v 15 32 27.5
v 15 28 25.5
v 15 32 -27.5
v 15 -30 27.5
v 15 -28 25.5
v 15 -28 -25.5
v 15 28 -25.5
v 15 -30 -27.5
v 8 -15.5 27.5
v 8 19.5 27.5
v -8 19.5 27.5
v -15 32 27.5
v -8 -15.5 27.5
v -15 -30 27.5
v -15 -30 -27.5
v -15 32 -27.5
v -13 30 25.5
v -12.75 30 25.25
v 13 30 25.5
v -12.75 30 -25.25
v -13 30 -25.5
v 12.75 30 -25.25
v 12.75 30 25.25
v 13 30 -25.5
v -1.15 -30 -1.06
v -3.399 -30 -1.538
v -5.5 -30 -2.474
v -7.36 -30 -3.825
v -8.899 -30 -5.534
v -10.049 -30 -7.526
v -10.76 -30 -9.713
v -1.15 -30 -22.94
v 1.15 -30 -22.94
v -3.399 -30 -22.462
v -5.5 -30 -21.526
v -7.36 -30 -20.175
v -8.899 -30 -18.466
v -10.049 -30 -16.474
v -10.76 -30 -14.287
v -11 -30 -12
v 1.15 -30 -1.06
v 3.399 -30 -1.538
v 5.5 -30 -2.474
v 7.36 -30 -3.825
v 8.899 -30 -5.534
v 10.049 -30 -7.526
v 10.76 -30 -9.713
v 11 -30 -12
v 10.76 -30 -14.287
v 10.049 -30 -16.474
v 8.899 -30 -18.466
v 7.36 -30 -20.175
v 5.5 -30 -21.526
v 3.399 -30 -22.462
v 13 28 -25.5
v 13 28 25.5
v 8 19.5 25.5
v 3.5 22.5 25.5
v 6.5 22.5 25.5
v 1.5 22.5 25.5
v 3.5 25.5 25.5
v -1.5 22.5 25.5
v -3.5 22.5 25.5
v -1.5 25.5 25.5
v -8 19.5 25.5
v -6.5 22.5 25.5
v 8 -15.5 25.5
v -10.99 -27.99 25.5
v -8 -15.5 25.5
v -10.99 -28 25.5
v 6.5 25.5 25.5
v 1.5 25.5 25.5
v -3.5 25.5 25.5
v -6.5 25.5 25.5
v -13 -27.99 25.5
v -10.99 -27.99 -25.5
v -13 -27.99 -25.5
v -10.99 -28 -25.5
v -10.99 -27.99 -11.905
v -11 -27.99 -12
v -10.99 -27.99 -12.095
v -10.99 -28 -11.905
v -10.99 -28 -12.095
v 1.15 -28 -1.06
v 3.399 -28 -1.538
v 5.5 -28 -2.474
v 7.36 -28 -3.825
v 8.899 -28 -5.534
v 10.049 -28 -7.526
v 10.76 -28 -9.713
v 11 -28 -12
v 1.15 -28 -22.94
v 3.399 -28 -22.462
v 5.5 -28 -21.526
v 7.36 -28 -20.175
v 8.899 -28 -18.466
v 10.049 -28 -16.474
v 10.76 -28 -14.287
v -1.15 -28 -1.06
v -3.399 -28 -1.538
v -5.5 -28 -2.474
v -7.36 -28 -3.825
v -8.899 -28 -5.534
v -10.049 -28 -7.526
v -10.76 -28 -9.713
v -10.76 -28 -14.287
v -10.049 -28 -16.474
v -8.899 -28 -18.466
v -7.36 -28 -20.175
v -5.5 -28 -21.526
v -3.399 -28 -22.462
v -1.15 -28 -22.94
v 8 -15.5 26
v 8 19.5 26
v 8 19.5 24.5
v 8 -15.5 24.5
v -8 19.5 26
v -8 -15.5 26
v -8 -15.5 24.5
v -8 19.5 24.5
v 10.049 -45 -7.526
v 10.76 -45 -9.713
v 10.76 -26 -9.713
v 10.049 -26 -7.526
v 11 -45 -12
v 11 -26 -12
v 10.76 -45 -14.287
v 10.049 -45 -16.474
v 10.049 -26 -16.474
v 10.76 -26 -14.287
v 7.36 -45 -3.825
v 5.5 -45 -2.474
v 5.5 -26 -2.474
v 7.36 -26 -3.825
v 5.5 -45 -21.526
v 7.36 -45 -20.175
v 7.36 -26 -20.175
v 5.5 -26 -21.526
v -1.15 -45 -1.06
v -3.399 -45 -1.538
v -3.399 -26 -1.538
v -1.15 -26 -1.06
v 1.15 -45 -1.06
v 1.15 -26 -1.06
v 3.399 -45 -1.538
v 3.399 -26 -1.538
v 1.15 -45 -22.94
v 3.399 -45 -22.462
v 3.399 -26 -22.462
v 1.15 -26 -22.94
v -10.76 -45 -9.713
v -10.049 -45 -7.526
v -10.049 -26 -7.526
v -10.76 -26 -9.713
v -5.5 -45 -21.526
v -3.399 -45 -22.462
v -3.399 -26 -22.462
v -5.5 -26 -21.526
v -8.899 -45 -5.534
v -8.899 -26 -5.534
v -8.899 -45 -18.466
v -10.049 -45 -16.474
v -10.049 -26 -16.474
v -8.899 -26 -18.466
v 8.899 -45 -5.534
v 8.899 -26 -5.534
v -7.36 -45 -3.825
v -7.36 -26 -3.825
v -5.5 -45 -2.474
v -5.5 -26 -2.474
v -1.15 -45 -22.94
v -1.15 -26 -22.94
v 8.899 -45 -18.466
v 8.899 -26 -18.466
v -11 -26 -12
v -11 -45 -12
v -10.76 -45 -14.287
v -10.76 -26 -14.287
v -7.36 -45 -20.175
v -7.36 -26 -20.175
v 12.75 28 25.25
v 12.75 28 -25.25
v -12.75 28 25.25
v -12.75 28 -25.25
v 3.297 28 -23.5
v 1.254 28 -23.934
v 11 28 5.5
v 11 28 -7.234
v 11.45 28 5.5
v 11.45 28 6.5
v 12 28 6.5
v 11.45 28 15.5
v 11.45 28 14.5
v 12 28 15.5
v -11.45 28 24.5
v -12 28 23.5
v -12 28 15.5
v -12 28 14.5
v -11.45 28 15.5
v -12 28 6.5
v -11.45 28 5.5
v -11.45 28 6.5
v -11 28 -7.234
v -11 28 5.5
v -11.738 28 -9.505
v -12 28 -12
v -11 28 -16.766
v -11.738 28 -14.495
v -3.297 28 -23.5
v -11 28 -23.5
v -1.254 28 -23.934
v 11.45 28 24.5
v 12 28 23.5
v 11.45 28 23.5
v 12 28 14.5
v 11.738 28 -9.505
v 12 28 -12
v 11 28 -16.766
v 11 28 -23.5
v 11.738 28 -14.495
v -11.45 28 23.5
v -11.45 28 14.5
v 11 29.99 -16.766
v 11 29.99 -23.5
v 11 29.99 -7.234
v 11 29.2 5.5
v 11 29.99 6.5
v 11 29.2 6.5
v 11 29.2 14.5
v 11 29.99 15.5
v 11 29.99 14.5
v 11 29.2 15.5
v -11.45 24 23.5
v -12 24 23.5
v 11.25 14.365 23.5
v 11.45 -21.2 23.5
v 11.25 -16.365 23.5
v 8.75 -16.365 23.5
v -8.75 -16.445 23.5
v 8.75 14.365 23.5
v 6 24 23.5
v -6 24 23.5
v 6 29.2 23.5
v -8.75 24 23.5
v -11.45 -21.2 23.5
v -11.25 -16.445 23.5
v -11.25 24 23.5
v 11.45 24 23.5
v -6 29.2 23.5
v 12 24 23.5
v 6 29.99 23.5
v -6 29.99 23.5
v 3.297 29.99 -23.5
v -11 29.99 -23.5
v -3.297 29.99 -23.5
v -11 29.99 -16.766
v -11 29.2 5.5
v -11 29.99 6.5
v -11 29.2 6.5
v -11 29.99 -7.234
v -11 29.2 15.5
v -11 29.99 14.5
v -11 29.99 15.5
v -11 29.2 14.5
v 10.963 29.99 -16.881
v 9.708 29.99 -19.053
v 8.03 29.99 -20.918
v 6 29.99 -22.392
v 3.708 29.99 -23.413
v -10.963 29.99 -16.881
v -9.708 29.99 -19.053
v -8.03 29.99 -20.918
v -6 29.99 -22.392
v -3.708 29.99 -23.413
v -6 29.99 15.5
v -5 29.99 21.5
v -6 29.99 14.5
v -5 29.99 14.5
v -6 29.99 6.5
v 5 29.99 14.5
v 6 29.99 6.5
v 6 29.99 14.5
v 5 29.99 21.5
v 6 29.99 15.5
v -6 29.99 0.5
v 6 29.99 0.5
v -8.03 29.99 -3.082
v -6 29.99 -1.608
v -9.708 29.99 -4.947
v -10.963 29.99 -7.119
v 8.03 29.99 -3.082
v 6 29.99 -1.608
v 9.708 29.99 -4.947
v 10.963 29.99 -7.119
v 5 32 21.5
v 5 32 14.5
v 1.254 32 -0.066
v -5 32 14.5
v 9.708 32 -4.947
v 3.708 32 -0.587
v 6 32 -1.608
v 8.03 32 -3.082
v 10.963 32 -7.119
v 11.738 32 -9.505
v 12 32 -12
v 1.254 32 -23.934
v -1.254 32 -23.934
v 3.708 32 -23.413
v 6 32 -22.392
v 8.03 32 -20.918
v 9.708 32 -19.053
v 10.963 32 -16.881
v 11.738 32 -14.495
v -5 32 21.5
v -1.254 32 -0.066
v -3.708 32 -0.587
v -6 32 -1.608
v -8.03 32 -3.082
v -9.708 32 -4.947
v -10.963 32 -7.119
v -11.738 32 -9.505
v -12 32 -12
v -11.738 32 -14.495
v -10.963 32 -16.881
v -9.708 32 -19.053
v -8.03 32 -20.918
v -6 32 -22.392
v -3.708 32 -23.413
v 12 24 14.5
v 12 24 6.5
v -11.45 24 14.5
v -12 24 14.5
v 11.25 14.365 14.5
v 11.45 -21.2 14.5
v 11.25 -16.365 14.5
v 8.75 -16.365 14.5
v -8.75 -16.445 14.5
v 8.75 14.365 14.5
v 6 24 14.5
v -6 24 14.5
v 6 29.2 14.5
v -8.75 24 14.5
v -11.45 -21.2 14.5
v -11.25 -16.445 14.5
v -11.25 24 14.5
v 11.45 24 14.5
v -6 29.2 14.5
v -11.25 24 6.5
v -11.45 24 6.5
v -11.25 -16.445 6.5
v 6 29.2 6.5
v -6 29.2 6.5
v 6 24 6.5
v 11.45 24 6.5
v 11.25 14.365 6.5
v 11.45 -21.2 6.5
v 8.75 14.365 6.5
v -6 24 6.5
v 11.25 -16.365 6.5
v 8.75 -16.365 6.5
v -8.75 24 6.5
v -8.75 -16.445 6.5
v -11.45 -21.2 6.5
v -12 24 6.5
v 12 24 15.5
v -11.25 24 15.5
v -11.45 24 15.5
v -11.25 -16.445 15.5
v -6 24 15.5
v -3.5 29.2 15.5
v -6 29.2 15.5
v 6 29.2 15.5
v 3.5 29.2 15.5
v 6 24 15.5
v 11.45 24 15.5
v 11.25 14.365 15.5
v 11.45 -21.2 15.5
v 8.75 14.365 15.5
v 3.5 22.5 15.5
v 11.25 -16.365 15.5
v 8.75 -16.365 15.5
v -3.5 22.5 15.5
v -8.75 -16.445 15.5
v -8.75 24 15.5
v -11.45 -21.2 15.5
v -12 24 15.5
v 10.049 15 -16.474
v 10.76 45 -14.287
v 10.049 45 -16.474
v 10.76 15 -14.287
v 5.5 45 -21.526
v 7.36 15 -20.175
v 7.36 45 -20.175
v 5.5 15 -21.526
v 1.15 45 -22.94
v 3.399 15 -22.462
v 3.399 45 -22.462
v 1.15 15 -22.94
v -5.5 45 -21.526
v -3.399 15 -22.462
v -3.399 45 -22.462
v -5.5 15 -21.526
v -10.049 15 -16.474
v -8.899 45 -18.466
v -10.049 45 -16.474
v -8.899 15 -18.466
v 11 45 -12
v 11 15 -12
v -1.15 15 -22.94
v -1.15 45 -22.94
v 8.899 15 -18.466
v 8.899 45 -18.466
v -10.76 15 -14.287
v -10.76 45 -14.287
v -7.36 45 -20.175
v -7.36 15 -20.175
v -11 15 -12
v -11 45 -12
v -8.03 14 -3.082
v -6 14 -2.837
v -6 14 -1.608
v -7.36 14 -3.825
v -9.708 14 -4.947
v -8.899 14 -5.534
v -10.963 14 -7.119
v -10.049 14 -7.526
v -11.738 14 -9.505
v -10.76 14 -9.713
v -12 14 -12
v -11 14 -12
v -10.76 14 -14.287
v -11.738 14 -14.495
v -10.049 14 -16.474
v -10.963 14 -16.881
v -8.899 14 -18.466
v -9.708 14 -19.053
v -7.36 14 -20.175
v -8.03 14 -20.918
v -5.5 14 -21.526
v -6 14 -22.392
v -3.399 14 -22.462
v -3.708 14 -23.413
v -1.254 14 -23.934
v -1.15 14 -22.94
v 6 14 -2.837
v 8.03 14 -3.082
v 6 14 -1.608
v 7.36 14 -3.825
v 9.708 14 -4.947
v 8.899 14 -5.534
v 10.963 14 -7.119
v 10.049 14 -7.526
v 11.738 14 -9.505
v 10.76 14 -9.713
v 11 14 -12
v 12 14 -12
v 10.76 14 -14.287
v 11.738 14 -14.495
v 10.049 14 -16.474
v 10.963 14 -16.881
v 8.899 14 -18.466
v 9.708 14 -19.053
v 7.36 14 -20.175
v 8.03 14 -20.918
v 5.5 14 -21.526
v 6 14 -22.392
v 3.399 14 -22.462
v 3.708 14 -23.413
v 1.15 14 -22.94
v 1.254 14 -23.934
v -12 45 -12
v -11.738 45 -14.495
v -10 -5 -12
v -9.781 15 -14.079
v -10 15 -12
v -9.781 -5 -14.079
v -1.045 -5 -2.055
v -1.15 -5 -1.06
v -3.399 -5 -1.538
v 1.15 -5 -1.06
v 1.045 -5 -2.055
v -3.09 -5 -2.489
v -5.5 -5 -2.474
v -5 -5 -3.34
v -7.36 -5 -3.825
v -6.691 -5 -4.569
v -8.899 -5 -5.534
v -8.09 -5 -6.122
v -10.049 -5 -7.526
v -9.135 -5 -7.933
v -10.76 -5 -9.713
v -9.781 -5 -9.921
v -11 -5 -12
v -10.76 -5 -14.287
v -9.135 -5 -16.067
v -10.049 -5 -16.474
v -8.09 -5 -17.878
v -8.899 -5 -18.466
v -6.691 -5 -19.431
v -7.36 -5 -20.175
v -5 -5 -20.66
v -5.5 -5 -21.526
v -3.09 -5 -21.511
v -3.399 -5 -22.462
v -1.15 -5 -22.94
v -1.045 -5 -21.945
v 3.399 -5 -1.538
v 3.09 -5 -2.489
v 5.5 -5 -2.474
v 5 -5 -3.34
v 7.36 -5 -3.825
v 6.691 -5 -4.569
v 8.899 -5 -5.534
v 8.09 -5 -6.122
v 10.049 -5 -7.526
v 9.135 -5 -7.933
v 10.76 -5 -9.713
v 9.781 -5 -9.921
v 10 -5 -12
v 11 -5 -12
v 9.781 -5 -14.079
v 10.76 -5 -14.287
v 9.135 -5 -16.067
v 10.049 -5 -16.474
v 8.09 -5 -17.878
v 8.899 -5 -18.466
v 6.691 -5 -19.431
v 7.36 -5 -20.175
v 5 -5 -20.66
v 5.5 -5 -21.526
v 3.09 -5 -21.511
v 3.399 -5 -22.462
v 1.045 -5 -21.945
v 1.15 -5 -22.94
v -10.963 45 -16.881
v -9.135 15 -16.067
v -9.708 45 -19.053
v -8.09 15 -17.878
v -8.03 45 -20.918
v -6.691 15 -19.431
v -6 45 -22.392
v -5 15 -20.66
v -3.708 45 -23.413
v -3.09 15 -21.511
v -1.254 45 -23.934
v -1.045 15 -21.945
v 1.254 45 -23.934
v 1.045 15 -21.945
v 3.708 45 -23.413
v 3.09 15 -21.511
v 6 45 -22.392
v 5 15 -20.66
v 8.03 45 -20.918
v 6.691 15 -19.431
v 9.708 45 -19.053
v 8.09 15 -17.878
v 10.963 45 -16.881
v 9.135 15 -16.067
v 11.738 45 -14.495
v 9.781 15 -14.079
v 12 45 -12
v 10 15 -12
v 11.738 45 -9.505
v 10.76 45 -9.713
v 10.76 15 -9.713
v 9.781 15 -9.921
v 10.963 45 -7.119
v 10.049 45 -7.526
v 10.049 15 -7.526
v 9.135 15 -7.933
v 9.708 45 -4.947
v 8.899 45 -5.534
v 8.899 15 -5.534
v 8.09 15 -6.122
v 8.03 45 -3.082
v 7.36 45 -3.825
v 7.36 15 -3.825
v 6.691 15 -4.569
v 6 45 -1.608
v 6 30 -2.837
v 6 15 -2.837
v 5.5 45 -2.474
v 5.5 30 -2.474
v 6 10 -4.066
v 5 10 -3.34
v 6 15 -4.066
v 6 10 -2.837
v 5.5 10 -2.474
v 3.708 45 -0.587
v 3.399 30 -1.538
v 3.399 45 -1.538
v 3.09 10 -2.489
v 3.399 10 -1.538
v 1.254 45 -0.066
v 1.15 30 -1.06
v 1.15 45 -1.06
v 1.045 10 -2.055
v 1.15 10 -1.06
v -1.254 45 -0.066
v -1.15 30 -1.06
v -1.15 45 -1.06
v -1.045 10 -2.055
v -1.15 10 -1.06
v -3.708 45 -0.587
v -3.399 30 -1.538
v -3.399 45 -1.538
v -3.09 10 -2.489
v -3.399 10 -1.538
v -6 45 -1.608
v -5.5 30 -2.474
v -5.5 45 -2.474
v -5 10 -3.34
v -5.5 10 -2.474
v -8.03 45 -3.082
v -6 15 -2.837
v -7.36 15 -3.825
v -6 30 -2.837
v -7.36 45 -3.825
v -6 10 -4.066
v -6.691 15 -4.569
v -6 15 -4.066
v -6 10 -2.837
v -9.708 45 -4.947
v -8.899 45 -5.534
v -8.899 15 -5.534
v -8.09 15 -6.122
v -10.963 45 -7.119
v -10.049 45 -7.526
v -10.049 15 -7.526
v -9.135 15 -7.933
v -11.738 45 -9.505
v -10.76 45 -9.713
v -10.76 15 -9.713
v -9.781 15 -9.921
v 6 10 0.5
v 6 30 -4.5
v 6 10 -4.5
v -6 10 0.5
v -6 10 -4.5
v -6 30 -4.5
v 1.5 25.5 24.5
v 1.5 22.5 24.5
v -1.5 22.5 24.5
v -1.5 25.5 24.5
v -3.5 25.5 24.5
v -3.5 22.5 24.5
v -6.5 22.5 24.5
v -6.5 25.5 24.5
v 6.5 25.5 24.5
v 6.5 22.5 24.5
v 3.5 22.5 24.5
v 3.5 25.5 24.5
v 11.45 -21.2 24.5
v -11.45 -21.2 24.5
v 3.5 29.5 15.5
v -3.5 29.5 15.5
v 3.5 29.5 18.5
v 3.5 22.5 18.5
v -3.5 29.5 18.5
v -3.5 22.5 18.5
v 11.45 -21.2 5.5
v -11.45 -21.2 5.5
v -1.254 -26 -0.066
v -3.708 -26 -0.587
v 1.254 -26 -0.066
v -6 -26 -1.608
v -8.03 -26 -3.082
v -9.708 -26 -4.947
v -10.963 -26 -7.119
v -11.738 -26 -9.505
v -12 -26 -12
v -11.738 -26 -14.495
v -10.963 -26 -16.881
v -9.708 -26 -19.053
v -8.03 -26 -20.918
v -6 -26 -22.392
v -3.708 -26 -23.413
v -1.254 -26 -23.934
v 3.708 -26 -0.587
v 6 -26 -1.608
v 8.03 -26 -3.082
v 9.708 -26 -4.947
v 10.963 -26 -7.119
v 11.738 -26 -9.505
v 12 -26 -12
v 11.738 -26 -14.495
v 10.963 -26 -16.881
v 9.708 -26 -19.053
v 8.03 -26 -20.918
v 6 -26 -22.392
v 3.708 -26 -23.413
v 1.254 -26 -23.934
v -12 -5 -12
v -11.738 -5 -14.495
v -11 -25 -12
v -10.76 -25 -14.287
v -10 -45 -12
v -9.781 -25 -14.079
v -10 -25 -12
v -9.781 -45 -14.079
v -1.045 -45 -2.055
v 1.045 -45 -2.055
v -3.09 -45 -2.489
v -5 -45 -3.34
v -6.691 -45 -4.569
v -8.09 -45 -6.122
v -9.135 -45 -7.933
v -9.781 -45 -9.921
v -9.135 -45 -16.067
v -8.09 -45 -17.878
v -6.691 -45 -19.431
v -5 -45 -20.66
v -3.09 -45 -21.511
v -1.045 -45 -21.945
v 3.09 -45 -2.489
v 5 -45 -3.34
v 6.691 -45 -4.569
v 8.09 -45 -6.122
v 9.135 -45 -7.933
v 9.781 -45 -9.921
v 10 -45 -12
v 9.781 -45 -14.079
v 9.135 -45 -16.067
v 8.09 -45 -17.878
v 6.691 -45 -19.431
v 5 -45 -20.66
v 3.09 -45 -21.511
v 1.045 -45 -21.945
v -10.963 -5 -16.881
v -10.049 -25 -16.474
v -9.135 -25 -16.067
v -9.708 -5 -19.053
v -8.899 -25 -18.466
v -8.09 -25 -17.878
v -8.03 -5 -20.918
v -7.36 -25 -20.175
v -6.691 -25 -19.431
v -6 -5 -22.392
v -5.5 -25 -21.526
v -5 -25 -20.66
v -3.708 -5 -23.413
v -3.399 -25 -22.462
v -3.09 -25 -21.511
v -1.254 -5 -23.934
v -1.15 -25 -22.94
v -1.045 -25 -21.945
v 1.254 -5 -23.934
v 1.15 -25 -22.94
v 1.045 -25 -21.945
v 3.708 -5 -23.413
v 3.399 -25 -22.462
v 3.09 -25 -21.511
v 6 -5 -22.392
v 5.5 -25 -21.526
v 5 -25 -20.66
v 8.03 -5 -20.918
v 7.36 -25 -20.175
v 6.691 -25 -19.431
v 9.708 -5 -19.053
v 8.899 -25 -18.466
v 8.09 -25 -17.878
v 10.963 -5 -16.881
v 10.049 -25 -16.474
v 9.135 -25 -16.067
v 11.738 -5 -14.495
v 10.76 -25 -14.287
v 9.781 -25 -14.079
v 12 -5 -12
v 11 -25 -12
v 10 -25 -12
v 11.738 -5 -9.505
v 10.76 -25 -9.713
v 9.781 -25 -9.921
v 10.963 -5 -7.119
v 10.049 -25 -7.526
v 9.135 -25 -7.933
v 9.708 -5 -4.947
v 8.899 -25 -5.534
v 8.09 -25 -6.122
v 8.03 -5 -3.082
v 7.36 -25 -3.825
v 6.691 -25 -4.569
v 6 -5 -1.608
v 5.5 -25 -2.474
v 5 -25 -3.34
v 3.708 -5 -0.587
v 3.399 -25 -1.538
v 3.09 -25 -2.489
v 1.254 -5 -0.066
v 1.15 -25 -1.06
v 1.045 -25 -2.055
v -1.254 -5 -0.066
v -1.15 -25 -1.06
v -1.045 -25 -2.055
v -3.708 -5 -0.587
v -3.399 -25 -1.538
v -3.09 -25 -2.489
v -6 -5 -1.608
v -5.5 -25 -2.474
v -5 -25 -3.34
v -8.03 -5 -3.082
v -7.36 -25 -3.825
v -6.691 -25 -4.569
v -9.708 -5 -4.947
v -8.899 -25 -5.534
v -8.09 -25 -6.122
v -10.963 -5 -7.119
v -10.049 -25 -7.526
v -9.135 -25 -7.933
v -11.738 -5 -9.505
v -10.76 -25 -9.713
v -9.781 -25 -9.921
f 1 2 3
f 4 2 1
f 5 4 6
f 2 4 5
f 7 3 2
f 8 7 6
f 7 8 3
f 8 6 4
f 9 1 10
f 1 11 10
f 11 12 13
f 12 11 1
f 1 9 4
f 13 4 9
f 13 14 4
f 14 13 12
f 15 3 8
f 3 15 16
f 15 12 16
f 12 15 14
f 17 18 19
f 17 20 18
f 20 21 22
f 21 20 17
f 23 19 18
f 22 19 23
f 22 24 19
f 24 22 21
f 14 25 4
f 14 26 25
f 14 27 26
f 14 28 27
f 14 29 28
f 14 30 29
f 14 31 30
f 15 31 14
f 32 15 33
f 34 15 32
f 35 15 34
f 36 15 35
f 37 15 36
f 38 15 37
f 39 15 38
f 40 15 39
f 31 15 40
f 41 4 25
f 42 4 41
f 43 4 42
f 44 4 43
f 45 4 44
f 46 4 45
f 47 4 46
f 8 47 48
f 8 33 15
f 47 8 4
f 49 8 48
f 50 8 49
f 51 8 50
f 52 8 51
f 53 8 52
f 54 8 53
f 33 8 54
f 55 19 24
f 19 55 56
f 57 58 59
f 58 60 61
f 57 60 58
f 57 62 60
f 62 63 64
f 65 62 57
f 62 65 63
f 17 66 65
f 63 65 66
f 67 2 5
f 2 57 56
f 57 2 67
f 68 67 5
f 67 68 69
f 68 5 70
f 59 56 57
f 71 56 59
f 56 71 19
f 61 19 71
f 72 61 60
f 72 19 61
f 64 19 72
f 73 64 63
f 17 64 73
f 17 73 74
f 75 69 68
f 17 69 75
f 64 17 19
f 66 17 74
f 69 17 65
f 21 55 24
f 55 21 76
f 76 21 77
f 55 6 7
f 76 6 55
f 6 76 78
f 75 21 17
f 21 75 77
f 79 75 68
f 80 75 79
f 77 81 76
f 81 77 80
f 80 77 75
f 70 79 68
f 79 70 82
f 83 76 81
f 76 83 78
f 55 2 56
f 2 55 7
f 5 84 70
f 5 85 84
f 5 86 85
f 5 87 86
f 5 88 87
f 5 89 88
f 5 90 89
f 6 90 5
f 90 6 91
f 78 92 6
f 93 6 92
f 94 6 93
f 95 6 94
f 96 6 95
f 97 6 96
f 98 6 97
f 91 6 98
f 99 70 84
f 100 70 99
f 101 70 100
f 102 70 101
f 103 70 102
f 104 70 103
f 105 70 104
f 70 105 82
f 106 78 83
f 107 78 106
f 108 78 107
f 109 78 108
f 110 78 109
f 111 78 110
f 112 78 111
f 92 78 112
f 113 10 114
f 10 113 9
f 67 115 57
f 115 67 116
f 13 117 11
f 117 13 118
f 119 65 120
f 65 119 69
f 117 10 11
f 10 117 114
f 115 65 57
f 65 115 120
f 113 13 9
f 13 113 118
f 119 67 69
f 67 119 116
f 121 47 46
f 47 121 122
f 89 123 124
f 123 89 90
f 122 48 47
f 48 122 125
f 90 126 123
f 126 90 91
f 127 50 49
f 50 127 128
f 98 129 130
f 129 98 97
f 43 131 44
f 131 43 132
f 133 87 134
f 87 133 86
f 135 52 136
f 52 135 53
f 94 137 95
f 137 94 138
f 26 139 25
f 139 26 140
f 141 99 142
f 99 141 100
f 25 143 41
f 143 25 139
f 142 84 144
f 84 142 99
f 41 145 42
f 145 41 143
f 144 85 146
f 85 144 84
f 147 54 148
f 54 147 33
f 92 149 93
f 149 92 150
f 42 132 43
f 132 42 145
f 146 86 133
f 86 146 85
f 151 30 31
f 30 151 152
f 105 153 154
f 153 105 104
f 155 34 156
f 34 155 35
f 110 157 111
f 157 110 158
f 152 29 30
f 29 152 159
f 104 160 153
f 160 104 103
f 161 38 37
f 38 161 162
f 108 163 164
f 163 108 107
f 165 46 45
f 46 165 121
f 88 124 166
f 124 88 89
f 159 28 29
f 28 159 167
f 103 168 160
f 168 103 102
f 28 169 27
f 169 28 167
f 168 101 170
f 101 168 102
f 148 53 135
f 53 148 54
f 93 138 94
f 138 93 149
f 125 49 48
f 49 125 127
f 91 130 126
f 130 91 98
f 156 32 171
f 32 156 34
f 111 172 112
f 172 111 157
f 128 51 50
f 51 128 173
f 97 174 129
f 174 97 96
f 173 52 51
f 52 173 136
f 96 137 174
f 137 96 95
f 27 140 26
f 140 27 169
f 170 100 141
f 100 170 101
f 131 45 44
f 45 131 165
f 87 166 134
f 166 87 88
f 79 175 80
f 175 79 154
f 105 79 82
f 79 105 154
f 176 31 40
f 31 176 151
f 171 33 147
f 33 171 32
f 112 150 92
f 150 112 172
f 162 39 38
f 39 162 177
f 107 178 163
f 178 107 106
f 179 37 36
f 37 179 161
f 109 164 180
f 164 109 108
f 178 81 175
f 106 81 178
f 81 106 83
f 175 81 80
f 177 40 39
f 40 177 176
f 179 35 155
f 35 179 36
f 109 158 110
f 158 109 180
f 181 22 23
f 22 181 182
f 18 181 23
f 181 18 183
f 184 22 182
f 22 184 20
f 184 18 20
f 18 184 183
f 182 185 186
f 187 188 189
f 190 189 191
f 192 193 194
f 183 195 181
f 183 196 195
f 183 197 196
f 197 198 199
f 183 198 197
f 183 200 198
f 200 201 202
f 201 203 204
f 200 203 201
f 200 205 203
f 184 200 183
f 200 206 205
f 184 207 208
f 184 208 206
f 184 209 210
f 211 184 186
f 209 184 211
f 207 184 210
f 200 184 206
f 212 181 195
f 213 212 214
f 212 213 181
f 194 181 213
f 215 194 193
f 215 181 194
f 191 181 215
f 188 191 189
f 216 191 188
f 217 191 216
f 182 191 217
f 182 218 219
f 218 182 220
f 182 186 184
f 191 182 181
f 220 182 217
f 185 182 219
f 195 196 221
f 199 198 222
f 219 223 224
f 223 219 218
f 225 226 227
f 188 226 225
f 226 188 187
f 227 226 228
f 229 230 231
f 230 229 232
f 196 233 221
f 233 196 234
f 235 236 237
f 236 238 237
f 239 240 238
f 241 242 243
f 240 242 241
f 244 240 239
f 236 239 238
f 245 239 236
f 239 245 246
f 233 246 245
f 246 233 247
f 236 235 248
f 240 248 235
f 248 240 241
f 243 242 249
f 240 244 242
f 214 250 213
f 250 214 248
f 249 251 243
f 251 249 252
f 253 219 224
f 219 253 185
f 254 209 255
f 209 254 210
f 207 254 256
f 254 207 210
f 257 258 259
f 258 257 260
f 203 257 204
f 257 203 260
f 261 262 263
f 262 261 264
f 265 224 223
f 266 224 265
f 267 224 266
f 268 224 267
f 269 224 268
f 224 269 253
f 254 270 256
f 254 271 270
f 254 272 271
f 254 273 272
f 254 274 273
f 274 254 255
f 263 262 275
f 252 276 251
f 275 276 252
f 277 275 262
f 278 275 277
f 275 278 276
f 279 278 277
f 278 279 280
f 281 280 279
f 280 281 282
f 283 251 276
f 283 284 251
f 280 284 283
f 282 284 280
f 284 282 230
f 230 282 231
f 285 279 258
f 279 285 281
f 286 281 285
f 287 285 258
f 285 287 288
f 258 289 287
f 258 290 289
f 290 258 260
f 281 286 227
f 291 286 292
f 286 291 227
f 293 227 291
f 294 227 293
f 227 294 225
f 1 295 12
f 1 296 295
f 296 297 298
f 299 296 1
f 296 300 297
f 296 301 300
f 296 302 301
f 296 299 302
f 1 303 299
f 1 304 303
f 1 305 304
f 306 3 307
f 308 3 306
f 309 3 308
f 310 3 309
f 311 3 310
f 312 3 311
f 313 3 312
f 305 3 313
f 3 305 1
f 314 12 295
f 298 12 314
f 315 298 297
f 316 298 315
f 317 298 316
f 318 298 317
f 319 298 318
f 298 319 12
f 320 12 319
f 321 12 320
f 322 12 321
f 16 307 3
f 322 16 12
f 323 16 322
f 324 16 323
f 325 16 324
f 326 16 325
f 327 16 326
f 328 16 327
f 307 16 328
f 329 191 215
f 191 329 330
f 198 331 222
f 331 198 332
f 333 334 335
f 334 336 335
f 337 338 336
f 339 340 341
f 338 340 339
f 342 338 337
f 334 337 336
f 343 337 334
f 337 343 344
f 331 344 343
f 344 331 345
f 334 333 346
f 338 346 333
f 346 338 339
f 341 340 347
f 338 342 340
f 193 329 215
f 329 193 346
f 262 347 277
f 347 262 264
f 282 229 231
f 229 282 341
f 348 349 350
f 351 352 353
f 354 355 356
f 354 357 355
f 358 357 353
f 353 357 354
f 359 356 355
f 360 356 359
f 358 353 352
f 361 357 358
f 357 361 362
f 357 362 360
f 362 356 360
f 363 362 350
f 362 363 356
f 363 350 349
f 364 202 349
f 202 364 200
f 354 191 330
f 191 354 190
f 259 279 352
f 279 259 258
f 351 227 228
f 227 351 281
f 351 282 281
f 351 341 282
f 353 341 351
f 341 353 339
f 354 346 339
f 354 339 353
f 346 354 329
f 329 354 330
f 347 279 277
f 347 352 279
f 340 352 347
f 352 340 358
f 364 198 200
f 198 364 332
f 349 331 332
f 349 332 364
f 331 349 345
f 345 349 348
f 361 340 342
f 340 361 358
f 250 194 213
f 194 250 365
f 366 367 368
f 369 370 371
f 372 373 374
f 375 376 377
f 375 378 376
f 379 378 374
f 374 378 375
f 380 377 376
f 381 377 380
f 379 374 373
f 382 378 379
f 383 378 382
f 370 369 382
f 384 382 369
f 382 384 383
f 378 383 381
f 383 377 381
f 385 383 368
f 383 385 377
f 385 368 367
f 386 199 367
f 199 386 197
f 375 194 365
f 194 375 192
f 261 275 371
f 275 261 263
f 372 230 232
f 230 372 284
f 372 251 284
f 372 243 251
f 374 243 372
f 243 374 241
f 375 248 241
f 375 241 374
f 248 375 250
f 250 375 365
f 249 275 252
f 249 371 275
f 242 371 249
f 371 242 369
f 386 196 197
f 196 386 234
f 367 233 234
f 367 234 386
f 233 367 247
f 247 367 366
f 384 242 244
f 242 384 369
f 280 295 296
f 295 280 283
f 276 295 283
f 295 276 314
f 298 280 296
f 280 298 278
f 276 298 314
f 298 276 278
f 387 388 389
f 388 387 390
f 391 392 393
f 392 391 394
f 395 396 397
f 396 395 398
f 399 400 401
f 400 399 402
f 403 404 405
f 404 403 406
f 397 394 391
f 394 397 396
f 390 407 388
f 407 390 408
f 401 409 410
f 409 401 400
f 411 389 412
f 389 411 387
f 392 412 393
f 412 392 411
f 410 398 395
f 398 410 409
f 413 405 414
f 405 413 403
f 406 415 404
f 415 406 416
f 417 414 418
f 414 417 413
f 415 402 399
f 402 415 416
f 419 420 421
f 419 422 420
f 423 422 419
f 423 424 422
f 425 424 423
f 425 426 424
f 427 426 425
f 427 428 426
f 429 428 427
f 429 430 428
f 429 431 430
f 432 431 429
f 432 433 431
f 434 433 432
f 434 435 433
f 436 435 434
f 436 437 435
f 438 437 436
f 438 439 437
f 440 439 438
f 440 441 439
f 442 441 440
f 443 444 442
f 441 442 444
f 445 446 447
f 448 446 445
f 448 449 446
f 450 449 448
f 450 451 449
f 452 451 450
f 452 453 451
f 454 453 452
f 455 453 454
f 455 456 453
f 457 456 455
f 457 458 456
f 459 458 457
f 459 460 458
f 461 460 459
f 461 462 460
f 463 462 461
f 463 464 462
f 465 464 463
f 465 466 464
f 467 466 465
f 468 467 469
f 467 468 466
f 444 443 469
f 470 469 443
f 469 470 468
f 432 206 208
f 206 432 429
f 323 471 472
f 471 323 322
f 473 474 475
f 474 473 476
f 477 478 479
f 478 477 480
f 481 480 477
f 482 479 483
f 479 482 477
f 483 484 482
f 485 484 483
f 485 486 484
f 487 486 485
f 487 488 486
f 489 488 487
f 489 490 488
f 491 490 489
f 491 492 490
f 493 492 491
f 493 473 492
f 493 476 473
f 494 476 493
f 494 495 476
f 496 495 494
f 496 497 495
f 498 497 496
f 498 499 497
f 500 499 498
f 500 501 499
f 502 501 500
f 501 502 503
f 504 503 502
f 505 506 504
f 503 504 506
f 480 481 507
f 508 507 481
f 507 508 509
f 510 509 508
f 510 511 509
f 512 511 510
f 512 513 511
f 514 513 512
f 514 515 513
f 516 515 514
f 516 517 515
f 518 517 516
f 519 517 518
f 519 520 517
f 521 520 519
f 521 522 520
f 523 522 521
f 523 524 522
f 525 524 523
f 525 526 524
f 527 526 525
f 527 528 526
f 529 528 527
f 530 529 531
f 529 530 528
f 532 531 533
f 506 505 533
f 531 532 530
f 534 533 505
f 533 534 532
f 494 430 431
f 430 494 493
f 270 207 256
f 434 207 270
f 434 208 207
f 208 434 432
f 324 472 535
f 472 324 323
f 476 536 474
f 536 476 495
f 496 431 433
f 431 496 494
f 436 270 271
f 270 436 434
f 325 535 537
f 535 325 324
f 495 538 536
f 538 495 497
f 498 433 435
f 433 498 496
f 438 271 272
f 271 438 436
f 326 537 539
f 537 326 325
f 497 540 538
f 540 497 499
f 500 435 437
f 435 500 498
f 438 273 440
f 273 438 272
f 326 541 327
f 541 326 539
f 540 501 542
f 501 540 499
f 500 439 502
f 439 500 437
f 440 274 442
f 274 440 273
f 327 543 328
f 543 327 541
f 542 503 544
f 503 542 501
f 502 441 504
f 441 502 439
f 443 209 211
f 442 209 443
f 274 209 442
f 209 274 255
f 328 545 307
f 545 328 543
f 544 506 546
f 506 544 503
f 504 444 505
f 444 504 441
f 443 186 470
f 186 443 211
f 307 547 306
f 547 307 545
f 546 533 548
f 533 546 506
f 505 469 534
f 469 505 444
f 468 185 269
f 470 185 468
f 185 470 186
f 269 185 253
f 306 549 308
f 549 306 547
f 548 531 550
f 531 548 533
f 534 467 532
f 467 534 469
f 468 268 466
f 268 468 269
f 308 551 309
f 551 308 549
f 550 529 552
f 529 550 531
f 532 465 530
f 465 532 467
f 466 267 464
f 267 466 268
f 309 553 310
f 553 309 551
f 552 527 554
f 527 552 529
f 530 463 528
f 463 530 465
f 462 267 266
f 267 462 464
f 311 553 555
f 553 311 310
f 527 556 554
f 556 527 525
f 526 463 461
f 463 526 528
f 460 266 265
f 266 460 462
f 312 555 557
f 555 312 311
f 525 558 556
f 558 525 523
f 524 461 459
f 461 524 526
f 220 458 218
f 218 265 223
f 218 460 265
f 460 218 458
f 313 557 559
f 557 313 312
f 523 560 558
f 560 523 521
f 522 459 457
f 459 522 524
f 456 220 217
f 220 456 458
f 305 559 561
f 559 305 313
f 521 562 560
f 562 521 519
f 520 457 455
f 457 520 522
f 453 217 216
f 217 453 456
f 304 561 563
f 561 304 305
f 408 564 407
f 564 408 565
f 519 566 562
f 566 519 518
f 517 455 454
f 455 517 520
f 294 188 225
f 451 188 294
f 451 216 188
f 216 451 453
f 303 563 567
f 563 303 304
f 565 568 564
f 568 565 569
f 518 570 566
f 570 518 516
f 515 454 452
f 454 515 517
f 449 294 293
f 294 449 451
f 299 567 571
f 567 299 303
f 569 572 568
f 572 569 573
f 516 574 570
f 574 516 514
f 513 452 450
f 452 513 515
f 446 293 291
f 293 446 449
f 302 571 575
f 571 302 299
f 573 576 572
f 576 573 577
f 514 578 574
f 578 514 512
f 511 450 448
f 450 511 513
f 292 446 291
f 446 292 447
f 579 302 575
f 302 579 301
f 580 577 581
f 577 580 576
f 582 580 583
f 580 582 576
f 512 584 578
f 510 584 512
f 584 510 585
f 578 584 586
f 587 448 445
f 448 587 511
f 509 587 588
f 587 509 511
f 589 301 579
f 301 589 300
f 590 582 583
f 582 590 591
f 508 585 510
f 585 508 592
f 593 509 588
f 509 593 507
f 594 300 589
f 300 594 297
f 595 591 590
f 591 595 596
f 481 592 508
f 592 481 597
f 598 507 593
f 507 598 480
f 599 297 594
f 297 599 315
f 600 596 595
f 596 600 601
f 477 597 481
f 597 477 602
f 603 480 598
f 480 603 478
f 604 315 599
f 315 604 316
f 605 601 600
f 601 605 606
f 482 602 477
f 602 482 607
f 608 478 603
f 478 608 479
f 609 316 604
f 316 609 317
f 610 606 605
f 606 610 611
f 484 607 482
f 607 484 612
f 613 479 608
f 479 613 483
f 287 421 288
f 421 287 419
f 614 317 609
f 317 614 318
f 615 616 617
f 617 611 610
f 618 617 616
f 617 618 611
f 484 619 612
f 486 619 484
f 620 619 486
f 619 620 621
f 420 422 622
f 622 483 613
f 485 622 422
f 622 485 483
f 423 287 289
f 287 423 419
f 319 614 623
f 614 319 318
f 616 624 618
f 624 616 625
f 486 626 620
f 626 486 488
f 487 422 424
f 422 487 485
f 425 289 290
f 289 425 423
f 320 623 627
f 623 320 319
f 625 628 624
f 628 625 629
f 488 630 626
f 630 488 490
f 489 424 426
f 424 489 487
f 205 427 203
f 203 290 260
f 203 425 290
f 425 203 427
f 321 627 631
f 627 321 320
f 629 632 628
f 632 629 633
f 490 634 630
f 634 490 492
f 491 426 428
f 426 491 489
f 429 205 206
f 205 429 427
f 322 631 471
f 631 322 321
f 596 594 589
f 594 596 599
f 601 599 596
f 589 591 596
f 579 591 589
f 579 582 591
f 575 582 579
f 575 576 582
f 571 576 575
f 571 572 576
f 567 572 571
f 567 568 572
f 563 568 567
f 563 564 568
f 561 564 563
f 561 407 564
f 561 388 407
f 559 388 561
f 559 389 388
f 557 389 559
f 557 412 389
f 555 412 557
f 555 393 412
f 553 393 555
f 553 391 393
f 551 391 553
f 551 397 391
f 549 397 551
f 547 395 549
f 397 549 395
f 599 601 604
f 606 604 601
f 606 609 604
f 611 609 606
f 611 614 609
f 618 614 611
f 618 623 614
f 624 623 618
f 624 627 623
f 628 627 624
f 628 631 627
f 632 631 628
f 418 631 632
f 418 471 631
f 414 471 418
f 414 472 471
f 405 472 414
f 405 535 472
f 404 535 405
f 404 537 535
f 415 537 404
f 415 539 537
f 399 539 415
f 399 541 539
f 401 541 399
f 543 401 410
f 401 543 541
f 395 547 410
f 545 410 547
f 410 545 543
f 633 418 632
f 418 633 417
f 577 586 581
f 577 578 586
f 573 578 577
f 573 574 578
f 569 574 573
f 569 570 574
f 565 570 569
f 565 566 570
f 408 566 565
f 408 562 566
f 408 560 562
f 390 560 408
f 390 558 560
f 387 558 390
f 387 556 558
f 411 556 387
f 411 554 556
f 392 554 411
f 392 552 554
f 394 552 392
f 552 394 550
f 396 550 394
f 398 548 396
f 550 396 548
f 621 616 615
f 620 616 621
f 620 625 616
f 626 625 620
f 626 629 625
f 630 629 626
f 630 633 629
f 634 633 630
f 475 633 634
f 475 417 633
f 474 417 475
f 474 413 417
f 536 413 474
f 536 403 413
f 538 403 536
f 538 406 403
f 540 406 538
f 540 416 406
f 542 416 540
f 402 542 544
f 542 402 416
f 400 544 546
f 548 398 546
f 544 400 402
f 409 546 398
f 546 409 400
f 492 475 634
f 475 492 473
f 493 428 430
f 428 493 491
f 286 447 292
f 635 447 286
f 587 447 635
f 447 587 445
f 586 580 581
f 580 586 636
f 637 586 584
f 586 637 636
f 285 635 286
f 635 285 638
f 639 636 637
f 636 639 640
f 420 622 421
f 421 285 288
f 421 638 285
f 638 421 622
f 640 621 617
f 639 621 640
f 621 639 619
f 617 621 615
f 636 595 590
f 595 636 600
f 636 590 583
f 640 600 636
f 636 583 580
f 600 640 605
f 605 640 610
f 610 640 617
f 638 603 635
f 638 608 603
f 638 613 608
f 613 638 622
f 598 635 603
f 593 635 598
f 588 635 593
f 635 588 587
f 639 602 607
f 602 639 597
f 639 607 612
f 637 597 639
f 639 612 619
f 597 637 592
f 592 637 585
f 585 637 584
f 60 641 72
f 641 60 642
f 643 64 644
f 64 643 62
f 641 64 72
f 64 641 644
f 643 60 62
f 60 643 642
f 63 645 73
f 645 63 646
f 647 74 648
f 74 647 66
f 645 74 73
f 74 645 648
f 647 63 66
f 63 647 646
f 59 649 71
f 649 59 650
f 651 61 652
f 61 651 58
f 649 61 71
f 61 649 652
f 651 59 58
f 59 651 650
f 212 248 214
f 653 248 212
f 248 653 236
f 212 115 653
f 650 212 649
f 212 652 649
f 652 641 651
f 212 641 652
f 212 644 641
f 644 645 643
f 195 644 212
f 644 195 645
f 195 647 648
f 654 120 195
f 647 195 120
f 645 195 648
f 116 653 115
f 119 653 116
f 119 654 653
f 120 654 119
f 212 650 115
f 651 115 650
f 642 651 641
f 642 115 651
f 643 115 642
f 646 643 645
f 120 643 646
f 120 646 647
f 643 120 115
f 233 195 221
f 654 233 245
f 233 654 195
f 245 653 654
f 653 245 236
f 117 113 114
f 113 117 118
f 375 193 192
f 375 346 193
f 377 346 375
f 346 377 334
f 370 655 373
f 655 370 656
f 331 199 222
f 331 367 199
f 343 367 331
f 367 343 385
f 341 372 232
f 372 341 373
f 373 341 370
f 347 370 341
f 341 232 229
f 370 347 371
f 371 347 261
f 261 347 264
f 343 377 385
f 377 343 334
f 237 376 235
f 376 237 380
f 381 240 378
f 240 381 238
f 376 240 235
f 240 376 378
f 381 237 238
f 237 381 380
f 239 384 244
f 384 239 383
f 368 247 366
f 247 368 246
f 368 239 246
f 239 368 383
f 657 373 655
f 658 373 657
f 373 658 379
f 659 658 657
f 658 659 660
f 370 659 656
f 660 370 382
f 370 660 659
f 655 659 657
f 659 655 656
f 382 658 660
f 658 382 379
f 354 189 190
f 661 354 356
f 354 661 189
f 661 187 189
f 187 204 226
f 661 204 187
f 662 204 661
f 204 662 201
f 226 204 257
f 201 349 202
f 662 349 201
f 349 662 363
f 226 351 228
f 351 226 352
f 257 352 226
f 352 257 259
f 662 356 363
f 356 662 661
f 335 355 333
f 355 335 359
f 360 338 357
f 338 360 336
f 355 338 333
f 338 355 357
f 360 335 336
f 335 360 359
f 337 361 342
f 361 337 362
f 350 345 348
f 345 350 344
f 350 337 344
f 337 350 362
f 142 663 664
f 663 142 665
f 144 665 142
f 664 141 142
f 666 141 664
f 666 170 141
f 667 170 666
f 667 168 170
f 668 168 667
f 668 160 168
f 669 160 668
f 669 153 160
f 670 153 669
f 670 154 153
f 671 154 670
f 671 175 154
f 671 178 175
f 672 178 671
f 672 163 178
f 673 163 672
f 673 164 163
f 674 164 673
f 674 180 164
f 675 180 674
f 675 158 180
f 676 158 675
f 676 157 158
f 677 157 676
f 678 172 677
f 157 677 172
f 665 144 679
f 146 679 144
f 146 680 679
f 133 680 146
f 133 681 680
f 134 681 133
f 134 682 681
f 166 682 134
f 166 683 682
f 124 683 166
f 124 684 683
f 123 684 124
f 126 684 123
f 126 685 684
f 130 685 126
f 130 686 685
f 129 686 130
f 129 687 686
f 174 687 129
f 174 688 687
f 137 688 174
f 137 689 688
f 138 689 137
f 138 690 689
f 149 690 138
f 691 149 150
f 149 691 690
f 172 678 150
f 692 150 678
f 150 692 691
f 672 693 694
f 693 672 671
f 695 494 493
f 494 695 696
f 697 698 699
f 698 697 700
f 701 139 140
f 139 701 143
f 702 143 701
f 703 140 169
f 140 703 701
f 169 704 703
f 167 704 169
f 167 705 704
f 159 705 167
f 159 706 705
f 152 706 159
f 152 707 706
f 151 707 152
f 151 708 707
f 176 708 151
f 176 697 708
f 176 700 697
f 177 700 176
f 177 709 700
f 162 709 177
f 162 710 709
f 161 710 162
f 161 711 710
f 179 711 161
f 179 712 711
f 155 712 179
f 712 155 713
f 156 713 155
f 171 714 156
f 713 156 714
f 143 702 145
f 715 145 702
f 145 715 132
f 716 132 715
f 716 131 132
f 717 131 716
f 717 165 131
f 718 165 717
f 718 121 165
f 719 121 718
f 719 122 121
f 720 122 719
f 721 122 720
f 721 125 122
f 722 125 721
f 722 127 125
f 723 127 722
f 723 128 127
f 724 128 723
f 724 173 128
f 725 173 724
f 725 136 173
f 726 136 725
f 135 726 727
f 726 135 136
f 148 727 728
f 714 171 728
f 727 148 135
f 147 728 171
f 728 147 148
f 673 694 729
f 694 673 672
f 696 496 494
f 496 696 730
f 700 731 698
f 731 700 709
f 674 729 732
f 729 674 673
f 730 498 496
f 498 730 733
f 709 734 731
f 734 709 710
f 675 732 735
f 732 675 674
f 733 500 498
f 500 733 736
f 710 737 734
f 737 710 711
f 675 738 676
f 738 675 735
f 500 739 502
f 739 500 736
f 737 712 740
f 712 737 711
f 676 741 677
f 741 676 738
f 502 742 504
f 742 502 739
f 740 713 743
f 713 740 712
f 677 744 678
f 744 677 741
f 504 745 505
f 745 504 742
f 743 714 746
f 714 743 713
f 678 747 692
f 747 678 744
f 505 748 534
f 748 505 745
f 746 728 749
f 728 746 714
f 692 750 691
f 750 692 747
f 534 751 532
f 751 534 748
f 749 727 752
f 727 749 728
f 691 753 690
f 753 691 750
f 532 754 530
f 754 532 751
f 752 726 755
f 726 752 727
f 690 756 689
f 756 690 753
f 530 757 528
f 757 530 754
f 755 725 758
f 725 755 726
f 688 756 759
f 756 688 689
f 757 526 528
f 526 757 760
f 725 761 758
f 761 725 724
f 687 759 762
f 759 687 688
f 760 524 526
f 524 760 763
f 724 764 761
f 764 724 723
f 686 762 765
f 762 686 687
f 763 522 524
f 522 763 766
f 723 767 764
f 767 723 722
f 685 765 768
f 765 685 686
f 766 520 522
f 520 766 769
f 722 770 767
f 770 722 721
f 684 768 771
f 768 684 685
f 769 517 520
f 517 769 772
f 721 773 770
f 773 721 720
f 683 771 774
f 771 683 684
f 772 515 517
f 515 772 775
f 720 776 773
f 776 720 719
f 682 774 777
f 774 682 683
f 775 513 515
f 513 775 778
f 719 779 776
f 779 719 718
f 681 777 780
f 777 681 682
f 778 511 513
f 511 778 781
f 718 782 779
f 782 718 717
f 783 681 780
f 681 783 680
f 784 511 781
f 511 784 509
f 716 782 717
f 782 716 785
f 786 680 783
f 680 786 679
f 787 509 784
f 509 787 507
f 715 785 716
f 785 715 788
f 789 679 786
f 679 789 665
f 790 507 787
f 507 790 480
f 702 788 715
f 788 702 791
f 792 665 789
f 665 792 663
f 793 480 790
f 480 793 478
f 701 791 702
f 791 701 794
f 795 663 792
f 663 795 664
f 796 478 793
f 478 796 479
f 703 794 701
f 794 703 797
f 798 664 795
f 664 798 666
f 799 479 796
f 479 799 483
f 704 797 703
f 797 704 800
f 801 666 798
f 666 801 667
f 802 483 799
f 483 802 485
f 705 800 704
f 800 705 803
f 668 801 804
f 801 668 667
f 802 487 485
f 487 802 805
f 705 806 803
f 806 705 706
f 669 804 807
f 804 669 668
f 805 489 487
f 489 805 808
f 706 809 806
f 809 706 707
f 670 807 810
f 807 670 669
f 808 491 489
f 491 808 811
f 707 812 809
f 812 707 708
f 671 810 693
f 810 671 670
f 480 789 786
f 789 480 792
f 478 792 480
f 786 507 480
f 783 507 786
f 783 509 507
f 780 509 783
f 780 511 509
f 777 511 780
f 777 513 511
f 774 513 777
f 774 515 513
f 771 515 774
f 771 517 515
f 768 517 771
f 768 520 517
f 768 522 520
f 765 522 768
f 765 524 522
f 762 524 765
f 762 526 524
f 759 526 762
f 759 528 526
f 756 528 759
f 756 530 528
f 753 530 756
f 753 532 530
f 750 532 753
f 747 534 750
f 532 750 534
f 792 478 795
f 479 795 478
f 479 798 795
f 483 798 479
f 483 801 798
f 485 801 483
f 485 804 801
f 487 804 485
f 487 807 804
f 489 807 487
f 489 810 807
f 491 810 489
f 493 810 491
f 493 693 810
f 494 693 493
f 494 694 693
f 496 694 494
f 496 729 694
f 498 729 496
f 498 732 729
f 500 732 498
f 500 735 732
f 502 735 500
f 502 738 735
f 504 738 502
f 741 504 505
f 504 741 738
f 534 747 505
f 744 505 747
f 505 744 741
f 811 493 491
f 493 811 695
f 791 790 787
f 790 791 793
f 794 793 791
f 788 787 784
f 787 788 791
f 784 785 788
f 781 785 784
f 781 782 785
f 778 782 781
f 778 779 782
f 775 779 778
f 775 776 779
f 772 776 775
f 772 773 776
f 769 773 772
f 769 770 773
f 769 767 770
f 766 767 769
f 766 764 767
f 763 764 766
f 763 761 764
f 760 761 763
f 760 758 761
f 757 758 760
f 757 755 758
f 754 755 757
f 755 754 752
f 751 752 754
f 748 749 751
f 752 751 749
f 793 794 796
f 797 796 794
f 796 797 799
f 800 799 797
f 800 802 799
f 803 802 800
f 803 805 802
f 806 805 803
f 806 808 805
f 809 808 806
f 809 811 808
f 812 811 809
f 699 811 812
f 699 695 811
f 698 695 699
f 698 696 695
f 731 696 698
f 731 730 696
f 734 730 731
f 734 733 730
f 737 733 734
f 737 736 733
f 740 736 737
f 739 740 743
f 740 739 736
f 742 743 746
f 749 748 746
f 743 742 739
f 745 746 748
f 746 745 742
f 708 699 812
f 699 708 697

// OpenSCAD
/////////////////////////////////////////
///// VentMon 0.5 Mechanical Design /////
/////     Public Invention 2022     /////
/////          Ben Coombs           /////
/////////////////////////////////////////

tol=0.01;

//////////// Housing ////////////

w = 30;
h = 55;
d = 60;
wt = 2;

case_nozzle_cutout_diameter = 22;
endcap_nozzle_cutout_diamater = 22;
airway_center_z = -12;

// Shell
union() {
    difference() {
        cube([w, d, h], center=true);

        translate([0,1.01,0])
        cube([w-2*wt, d-wt, h-2*wt], center=true);

        // Side cutout (temporary)
        translate([2.01,0,0])
        cube([w-2*wt, d-2*wt, h-2*wt], center=true);
        
        // Display cutout
        translate([0,2,h/2-wt/2])
        cube([16,35,4], center=true);
        
        // Nozzle cutout
        translate([0,-d/2+wt/2,airway_center_z])
        rotate([90,0,0])
        cylinder(h=10, d=case_nozzle_cutout_diameter, center=true);
        
    }
}

temp_endcap_move = 0;

// End cap
color("red")
translate([0,temp_endcap_move,0])
difference() {
    union()
    {
        // End cap
        translate([0,d/2+wt/2,0])
        cube([w, wt, h], center=true);
        
        // End cap inner lip
        difference() {
            translate([0,d/2-wt/2,0])
            cube([w-wt*2-0.5, wt, h-wt*2-0.5], center=true);
            translate([0,d/2-wt/2-tol,0])
            cube([w-wt*4, wt, h-wt*2-4], center=true);
        }
                
        // PCB mounts
        translate([w/2-6,27,10.5])
        cube([6,6,8], center=true);
        translate([-w/2+6,27,10.5])
        cube([6,6,8], center=true);
        
        translate([w/2-6,27,19.5])
        cube([6,6,8], center=true);
        translate([-w/2+6,27,19.5])
        cube([6,6,8], center=true);
    }
    
    // USB port cutout
    translate([0,d/2,18])
    cube([10,8,7], center=true);
        
    // Flow sensor cutout
    translate([0,d/2,airway_center_z])
    rotate([90,0,0])
    cylinder(h=6, d=endcap_nozzle_cutout_diamater, center=true);
}

//////////// Flow Sensor ////////////

color("lightgrey")
translate([0,temp_endcap_move+20,airway_center_z])
flow_sensor();

module flow_sensor() {
    id = 10;
    t = 1;
    x = 50;
        
    translate([0,-x/2,0])
    rotate([270,0,0])
    rotate_extrude()
    polygon([[id,0], [id,20],[id+t,20],[id+t,x],
            [id+2*t,x],[id+2*t,19],[id+t,19],[id+t,0]]);
    
    translate([0,0,id])
    cube([12,20,5], center=true);
}

//////////// Nozzle ////////////

color("lightblue")
translate([0,-25,airway_center_z])
nozzle();

module nozzle() {
    id = 10;
    t = 1;
    x = 40;
        
    translate([0,-x/2,0])
    rotate([270,0,0])
    rotate_extrude()
    polygon([[id,0], [id,x/2],[id+t,x/2],[id+t,x],
            [id+2*t,x],[id+2*t,x/2-t],[id+t,x/2-t],[id+t,0]]);
}

//////////// PCB ////////////

module feather_pcb() {
    pcb_length = 50.4;
    pcb_width = 22.9;
    color("green")
    cube([pcb_width,pcb_length,1], center=true);
}

module header(num_pins) {
    header_width = 2.5;
    header_height = 8.5;
    header_length = 2.54 * num_pins + 0.25;
    color("black")
    cube([header_width, header_length, header_height], center=true);
}

// PCB stack
translate([0,temp_endcap_move+4,15])
{
    // Top
    translate([0,0,9]) {
        feather_pcb();
        // OLED
        color("black")
        translate([0,-2,1])
        cube([16,35,2], center=true);
        // OLED buttons
        color("grey"){
            translate([0,20,1.5])
            cube([3,3,3], center=true);
            translate([-5,20,1.5])
            cube([3,3,3], center=true);
            translate([5,20,1.5])
            cube([3,3,3], center=true);
        }
    }
    
    // Mid
    feather_pcb();
    translate([10,-5,4.25])
    header(12);
    translate([-10,0,4.25])
    header(16);
    // USB port
    color("grey")
    translate([0,22,2])
    cube([7,7,3], center=true);
    
    // Bottom
    translate([0,0,-9])
    feather_pcb();
    translate([10,-5,4.25-9])
    header(12);
    translate([-10,0,4.25-9])
    header(16);
}
